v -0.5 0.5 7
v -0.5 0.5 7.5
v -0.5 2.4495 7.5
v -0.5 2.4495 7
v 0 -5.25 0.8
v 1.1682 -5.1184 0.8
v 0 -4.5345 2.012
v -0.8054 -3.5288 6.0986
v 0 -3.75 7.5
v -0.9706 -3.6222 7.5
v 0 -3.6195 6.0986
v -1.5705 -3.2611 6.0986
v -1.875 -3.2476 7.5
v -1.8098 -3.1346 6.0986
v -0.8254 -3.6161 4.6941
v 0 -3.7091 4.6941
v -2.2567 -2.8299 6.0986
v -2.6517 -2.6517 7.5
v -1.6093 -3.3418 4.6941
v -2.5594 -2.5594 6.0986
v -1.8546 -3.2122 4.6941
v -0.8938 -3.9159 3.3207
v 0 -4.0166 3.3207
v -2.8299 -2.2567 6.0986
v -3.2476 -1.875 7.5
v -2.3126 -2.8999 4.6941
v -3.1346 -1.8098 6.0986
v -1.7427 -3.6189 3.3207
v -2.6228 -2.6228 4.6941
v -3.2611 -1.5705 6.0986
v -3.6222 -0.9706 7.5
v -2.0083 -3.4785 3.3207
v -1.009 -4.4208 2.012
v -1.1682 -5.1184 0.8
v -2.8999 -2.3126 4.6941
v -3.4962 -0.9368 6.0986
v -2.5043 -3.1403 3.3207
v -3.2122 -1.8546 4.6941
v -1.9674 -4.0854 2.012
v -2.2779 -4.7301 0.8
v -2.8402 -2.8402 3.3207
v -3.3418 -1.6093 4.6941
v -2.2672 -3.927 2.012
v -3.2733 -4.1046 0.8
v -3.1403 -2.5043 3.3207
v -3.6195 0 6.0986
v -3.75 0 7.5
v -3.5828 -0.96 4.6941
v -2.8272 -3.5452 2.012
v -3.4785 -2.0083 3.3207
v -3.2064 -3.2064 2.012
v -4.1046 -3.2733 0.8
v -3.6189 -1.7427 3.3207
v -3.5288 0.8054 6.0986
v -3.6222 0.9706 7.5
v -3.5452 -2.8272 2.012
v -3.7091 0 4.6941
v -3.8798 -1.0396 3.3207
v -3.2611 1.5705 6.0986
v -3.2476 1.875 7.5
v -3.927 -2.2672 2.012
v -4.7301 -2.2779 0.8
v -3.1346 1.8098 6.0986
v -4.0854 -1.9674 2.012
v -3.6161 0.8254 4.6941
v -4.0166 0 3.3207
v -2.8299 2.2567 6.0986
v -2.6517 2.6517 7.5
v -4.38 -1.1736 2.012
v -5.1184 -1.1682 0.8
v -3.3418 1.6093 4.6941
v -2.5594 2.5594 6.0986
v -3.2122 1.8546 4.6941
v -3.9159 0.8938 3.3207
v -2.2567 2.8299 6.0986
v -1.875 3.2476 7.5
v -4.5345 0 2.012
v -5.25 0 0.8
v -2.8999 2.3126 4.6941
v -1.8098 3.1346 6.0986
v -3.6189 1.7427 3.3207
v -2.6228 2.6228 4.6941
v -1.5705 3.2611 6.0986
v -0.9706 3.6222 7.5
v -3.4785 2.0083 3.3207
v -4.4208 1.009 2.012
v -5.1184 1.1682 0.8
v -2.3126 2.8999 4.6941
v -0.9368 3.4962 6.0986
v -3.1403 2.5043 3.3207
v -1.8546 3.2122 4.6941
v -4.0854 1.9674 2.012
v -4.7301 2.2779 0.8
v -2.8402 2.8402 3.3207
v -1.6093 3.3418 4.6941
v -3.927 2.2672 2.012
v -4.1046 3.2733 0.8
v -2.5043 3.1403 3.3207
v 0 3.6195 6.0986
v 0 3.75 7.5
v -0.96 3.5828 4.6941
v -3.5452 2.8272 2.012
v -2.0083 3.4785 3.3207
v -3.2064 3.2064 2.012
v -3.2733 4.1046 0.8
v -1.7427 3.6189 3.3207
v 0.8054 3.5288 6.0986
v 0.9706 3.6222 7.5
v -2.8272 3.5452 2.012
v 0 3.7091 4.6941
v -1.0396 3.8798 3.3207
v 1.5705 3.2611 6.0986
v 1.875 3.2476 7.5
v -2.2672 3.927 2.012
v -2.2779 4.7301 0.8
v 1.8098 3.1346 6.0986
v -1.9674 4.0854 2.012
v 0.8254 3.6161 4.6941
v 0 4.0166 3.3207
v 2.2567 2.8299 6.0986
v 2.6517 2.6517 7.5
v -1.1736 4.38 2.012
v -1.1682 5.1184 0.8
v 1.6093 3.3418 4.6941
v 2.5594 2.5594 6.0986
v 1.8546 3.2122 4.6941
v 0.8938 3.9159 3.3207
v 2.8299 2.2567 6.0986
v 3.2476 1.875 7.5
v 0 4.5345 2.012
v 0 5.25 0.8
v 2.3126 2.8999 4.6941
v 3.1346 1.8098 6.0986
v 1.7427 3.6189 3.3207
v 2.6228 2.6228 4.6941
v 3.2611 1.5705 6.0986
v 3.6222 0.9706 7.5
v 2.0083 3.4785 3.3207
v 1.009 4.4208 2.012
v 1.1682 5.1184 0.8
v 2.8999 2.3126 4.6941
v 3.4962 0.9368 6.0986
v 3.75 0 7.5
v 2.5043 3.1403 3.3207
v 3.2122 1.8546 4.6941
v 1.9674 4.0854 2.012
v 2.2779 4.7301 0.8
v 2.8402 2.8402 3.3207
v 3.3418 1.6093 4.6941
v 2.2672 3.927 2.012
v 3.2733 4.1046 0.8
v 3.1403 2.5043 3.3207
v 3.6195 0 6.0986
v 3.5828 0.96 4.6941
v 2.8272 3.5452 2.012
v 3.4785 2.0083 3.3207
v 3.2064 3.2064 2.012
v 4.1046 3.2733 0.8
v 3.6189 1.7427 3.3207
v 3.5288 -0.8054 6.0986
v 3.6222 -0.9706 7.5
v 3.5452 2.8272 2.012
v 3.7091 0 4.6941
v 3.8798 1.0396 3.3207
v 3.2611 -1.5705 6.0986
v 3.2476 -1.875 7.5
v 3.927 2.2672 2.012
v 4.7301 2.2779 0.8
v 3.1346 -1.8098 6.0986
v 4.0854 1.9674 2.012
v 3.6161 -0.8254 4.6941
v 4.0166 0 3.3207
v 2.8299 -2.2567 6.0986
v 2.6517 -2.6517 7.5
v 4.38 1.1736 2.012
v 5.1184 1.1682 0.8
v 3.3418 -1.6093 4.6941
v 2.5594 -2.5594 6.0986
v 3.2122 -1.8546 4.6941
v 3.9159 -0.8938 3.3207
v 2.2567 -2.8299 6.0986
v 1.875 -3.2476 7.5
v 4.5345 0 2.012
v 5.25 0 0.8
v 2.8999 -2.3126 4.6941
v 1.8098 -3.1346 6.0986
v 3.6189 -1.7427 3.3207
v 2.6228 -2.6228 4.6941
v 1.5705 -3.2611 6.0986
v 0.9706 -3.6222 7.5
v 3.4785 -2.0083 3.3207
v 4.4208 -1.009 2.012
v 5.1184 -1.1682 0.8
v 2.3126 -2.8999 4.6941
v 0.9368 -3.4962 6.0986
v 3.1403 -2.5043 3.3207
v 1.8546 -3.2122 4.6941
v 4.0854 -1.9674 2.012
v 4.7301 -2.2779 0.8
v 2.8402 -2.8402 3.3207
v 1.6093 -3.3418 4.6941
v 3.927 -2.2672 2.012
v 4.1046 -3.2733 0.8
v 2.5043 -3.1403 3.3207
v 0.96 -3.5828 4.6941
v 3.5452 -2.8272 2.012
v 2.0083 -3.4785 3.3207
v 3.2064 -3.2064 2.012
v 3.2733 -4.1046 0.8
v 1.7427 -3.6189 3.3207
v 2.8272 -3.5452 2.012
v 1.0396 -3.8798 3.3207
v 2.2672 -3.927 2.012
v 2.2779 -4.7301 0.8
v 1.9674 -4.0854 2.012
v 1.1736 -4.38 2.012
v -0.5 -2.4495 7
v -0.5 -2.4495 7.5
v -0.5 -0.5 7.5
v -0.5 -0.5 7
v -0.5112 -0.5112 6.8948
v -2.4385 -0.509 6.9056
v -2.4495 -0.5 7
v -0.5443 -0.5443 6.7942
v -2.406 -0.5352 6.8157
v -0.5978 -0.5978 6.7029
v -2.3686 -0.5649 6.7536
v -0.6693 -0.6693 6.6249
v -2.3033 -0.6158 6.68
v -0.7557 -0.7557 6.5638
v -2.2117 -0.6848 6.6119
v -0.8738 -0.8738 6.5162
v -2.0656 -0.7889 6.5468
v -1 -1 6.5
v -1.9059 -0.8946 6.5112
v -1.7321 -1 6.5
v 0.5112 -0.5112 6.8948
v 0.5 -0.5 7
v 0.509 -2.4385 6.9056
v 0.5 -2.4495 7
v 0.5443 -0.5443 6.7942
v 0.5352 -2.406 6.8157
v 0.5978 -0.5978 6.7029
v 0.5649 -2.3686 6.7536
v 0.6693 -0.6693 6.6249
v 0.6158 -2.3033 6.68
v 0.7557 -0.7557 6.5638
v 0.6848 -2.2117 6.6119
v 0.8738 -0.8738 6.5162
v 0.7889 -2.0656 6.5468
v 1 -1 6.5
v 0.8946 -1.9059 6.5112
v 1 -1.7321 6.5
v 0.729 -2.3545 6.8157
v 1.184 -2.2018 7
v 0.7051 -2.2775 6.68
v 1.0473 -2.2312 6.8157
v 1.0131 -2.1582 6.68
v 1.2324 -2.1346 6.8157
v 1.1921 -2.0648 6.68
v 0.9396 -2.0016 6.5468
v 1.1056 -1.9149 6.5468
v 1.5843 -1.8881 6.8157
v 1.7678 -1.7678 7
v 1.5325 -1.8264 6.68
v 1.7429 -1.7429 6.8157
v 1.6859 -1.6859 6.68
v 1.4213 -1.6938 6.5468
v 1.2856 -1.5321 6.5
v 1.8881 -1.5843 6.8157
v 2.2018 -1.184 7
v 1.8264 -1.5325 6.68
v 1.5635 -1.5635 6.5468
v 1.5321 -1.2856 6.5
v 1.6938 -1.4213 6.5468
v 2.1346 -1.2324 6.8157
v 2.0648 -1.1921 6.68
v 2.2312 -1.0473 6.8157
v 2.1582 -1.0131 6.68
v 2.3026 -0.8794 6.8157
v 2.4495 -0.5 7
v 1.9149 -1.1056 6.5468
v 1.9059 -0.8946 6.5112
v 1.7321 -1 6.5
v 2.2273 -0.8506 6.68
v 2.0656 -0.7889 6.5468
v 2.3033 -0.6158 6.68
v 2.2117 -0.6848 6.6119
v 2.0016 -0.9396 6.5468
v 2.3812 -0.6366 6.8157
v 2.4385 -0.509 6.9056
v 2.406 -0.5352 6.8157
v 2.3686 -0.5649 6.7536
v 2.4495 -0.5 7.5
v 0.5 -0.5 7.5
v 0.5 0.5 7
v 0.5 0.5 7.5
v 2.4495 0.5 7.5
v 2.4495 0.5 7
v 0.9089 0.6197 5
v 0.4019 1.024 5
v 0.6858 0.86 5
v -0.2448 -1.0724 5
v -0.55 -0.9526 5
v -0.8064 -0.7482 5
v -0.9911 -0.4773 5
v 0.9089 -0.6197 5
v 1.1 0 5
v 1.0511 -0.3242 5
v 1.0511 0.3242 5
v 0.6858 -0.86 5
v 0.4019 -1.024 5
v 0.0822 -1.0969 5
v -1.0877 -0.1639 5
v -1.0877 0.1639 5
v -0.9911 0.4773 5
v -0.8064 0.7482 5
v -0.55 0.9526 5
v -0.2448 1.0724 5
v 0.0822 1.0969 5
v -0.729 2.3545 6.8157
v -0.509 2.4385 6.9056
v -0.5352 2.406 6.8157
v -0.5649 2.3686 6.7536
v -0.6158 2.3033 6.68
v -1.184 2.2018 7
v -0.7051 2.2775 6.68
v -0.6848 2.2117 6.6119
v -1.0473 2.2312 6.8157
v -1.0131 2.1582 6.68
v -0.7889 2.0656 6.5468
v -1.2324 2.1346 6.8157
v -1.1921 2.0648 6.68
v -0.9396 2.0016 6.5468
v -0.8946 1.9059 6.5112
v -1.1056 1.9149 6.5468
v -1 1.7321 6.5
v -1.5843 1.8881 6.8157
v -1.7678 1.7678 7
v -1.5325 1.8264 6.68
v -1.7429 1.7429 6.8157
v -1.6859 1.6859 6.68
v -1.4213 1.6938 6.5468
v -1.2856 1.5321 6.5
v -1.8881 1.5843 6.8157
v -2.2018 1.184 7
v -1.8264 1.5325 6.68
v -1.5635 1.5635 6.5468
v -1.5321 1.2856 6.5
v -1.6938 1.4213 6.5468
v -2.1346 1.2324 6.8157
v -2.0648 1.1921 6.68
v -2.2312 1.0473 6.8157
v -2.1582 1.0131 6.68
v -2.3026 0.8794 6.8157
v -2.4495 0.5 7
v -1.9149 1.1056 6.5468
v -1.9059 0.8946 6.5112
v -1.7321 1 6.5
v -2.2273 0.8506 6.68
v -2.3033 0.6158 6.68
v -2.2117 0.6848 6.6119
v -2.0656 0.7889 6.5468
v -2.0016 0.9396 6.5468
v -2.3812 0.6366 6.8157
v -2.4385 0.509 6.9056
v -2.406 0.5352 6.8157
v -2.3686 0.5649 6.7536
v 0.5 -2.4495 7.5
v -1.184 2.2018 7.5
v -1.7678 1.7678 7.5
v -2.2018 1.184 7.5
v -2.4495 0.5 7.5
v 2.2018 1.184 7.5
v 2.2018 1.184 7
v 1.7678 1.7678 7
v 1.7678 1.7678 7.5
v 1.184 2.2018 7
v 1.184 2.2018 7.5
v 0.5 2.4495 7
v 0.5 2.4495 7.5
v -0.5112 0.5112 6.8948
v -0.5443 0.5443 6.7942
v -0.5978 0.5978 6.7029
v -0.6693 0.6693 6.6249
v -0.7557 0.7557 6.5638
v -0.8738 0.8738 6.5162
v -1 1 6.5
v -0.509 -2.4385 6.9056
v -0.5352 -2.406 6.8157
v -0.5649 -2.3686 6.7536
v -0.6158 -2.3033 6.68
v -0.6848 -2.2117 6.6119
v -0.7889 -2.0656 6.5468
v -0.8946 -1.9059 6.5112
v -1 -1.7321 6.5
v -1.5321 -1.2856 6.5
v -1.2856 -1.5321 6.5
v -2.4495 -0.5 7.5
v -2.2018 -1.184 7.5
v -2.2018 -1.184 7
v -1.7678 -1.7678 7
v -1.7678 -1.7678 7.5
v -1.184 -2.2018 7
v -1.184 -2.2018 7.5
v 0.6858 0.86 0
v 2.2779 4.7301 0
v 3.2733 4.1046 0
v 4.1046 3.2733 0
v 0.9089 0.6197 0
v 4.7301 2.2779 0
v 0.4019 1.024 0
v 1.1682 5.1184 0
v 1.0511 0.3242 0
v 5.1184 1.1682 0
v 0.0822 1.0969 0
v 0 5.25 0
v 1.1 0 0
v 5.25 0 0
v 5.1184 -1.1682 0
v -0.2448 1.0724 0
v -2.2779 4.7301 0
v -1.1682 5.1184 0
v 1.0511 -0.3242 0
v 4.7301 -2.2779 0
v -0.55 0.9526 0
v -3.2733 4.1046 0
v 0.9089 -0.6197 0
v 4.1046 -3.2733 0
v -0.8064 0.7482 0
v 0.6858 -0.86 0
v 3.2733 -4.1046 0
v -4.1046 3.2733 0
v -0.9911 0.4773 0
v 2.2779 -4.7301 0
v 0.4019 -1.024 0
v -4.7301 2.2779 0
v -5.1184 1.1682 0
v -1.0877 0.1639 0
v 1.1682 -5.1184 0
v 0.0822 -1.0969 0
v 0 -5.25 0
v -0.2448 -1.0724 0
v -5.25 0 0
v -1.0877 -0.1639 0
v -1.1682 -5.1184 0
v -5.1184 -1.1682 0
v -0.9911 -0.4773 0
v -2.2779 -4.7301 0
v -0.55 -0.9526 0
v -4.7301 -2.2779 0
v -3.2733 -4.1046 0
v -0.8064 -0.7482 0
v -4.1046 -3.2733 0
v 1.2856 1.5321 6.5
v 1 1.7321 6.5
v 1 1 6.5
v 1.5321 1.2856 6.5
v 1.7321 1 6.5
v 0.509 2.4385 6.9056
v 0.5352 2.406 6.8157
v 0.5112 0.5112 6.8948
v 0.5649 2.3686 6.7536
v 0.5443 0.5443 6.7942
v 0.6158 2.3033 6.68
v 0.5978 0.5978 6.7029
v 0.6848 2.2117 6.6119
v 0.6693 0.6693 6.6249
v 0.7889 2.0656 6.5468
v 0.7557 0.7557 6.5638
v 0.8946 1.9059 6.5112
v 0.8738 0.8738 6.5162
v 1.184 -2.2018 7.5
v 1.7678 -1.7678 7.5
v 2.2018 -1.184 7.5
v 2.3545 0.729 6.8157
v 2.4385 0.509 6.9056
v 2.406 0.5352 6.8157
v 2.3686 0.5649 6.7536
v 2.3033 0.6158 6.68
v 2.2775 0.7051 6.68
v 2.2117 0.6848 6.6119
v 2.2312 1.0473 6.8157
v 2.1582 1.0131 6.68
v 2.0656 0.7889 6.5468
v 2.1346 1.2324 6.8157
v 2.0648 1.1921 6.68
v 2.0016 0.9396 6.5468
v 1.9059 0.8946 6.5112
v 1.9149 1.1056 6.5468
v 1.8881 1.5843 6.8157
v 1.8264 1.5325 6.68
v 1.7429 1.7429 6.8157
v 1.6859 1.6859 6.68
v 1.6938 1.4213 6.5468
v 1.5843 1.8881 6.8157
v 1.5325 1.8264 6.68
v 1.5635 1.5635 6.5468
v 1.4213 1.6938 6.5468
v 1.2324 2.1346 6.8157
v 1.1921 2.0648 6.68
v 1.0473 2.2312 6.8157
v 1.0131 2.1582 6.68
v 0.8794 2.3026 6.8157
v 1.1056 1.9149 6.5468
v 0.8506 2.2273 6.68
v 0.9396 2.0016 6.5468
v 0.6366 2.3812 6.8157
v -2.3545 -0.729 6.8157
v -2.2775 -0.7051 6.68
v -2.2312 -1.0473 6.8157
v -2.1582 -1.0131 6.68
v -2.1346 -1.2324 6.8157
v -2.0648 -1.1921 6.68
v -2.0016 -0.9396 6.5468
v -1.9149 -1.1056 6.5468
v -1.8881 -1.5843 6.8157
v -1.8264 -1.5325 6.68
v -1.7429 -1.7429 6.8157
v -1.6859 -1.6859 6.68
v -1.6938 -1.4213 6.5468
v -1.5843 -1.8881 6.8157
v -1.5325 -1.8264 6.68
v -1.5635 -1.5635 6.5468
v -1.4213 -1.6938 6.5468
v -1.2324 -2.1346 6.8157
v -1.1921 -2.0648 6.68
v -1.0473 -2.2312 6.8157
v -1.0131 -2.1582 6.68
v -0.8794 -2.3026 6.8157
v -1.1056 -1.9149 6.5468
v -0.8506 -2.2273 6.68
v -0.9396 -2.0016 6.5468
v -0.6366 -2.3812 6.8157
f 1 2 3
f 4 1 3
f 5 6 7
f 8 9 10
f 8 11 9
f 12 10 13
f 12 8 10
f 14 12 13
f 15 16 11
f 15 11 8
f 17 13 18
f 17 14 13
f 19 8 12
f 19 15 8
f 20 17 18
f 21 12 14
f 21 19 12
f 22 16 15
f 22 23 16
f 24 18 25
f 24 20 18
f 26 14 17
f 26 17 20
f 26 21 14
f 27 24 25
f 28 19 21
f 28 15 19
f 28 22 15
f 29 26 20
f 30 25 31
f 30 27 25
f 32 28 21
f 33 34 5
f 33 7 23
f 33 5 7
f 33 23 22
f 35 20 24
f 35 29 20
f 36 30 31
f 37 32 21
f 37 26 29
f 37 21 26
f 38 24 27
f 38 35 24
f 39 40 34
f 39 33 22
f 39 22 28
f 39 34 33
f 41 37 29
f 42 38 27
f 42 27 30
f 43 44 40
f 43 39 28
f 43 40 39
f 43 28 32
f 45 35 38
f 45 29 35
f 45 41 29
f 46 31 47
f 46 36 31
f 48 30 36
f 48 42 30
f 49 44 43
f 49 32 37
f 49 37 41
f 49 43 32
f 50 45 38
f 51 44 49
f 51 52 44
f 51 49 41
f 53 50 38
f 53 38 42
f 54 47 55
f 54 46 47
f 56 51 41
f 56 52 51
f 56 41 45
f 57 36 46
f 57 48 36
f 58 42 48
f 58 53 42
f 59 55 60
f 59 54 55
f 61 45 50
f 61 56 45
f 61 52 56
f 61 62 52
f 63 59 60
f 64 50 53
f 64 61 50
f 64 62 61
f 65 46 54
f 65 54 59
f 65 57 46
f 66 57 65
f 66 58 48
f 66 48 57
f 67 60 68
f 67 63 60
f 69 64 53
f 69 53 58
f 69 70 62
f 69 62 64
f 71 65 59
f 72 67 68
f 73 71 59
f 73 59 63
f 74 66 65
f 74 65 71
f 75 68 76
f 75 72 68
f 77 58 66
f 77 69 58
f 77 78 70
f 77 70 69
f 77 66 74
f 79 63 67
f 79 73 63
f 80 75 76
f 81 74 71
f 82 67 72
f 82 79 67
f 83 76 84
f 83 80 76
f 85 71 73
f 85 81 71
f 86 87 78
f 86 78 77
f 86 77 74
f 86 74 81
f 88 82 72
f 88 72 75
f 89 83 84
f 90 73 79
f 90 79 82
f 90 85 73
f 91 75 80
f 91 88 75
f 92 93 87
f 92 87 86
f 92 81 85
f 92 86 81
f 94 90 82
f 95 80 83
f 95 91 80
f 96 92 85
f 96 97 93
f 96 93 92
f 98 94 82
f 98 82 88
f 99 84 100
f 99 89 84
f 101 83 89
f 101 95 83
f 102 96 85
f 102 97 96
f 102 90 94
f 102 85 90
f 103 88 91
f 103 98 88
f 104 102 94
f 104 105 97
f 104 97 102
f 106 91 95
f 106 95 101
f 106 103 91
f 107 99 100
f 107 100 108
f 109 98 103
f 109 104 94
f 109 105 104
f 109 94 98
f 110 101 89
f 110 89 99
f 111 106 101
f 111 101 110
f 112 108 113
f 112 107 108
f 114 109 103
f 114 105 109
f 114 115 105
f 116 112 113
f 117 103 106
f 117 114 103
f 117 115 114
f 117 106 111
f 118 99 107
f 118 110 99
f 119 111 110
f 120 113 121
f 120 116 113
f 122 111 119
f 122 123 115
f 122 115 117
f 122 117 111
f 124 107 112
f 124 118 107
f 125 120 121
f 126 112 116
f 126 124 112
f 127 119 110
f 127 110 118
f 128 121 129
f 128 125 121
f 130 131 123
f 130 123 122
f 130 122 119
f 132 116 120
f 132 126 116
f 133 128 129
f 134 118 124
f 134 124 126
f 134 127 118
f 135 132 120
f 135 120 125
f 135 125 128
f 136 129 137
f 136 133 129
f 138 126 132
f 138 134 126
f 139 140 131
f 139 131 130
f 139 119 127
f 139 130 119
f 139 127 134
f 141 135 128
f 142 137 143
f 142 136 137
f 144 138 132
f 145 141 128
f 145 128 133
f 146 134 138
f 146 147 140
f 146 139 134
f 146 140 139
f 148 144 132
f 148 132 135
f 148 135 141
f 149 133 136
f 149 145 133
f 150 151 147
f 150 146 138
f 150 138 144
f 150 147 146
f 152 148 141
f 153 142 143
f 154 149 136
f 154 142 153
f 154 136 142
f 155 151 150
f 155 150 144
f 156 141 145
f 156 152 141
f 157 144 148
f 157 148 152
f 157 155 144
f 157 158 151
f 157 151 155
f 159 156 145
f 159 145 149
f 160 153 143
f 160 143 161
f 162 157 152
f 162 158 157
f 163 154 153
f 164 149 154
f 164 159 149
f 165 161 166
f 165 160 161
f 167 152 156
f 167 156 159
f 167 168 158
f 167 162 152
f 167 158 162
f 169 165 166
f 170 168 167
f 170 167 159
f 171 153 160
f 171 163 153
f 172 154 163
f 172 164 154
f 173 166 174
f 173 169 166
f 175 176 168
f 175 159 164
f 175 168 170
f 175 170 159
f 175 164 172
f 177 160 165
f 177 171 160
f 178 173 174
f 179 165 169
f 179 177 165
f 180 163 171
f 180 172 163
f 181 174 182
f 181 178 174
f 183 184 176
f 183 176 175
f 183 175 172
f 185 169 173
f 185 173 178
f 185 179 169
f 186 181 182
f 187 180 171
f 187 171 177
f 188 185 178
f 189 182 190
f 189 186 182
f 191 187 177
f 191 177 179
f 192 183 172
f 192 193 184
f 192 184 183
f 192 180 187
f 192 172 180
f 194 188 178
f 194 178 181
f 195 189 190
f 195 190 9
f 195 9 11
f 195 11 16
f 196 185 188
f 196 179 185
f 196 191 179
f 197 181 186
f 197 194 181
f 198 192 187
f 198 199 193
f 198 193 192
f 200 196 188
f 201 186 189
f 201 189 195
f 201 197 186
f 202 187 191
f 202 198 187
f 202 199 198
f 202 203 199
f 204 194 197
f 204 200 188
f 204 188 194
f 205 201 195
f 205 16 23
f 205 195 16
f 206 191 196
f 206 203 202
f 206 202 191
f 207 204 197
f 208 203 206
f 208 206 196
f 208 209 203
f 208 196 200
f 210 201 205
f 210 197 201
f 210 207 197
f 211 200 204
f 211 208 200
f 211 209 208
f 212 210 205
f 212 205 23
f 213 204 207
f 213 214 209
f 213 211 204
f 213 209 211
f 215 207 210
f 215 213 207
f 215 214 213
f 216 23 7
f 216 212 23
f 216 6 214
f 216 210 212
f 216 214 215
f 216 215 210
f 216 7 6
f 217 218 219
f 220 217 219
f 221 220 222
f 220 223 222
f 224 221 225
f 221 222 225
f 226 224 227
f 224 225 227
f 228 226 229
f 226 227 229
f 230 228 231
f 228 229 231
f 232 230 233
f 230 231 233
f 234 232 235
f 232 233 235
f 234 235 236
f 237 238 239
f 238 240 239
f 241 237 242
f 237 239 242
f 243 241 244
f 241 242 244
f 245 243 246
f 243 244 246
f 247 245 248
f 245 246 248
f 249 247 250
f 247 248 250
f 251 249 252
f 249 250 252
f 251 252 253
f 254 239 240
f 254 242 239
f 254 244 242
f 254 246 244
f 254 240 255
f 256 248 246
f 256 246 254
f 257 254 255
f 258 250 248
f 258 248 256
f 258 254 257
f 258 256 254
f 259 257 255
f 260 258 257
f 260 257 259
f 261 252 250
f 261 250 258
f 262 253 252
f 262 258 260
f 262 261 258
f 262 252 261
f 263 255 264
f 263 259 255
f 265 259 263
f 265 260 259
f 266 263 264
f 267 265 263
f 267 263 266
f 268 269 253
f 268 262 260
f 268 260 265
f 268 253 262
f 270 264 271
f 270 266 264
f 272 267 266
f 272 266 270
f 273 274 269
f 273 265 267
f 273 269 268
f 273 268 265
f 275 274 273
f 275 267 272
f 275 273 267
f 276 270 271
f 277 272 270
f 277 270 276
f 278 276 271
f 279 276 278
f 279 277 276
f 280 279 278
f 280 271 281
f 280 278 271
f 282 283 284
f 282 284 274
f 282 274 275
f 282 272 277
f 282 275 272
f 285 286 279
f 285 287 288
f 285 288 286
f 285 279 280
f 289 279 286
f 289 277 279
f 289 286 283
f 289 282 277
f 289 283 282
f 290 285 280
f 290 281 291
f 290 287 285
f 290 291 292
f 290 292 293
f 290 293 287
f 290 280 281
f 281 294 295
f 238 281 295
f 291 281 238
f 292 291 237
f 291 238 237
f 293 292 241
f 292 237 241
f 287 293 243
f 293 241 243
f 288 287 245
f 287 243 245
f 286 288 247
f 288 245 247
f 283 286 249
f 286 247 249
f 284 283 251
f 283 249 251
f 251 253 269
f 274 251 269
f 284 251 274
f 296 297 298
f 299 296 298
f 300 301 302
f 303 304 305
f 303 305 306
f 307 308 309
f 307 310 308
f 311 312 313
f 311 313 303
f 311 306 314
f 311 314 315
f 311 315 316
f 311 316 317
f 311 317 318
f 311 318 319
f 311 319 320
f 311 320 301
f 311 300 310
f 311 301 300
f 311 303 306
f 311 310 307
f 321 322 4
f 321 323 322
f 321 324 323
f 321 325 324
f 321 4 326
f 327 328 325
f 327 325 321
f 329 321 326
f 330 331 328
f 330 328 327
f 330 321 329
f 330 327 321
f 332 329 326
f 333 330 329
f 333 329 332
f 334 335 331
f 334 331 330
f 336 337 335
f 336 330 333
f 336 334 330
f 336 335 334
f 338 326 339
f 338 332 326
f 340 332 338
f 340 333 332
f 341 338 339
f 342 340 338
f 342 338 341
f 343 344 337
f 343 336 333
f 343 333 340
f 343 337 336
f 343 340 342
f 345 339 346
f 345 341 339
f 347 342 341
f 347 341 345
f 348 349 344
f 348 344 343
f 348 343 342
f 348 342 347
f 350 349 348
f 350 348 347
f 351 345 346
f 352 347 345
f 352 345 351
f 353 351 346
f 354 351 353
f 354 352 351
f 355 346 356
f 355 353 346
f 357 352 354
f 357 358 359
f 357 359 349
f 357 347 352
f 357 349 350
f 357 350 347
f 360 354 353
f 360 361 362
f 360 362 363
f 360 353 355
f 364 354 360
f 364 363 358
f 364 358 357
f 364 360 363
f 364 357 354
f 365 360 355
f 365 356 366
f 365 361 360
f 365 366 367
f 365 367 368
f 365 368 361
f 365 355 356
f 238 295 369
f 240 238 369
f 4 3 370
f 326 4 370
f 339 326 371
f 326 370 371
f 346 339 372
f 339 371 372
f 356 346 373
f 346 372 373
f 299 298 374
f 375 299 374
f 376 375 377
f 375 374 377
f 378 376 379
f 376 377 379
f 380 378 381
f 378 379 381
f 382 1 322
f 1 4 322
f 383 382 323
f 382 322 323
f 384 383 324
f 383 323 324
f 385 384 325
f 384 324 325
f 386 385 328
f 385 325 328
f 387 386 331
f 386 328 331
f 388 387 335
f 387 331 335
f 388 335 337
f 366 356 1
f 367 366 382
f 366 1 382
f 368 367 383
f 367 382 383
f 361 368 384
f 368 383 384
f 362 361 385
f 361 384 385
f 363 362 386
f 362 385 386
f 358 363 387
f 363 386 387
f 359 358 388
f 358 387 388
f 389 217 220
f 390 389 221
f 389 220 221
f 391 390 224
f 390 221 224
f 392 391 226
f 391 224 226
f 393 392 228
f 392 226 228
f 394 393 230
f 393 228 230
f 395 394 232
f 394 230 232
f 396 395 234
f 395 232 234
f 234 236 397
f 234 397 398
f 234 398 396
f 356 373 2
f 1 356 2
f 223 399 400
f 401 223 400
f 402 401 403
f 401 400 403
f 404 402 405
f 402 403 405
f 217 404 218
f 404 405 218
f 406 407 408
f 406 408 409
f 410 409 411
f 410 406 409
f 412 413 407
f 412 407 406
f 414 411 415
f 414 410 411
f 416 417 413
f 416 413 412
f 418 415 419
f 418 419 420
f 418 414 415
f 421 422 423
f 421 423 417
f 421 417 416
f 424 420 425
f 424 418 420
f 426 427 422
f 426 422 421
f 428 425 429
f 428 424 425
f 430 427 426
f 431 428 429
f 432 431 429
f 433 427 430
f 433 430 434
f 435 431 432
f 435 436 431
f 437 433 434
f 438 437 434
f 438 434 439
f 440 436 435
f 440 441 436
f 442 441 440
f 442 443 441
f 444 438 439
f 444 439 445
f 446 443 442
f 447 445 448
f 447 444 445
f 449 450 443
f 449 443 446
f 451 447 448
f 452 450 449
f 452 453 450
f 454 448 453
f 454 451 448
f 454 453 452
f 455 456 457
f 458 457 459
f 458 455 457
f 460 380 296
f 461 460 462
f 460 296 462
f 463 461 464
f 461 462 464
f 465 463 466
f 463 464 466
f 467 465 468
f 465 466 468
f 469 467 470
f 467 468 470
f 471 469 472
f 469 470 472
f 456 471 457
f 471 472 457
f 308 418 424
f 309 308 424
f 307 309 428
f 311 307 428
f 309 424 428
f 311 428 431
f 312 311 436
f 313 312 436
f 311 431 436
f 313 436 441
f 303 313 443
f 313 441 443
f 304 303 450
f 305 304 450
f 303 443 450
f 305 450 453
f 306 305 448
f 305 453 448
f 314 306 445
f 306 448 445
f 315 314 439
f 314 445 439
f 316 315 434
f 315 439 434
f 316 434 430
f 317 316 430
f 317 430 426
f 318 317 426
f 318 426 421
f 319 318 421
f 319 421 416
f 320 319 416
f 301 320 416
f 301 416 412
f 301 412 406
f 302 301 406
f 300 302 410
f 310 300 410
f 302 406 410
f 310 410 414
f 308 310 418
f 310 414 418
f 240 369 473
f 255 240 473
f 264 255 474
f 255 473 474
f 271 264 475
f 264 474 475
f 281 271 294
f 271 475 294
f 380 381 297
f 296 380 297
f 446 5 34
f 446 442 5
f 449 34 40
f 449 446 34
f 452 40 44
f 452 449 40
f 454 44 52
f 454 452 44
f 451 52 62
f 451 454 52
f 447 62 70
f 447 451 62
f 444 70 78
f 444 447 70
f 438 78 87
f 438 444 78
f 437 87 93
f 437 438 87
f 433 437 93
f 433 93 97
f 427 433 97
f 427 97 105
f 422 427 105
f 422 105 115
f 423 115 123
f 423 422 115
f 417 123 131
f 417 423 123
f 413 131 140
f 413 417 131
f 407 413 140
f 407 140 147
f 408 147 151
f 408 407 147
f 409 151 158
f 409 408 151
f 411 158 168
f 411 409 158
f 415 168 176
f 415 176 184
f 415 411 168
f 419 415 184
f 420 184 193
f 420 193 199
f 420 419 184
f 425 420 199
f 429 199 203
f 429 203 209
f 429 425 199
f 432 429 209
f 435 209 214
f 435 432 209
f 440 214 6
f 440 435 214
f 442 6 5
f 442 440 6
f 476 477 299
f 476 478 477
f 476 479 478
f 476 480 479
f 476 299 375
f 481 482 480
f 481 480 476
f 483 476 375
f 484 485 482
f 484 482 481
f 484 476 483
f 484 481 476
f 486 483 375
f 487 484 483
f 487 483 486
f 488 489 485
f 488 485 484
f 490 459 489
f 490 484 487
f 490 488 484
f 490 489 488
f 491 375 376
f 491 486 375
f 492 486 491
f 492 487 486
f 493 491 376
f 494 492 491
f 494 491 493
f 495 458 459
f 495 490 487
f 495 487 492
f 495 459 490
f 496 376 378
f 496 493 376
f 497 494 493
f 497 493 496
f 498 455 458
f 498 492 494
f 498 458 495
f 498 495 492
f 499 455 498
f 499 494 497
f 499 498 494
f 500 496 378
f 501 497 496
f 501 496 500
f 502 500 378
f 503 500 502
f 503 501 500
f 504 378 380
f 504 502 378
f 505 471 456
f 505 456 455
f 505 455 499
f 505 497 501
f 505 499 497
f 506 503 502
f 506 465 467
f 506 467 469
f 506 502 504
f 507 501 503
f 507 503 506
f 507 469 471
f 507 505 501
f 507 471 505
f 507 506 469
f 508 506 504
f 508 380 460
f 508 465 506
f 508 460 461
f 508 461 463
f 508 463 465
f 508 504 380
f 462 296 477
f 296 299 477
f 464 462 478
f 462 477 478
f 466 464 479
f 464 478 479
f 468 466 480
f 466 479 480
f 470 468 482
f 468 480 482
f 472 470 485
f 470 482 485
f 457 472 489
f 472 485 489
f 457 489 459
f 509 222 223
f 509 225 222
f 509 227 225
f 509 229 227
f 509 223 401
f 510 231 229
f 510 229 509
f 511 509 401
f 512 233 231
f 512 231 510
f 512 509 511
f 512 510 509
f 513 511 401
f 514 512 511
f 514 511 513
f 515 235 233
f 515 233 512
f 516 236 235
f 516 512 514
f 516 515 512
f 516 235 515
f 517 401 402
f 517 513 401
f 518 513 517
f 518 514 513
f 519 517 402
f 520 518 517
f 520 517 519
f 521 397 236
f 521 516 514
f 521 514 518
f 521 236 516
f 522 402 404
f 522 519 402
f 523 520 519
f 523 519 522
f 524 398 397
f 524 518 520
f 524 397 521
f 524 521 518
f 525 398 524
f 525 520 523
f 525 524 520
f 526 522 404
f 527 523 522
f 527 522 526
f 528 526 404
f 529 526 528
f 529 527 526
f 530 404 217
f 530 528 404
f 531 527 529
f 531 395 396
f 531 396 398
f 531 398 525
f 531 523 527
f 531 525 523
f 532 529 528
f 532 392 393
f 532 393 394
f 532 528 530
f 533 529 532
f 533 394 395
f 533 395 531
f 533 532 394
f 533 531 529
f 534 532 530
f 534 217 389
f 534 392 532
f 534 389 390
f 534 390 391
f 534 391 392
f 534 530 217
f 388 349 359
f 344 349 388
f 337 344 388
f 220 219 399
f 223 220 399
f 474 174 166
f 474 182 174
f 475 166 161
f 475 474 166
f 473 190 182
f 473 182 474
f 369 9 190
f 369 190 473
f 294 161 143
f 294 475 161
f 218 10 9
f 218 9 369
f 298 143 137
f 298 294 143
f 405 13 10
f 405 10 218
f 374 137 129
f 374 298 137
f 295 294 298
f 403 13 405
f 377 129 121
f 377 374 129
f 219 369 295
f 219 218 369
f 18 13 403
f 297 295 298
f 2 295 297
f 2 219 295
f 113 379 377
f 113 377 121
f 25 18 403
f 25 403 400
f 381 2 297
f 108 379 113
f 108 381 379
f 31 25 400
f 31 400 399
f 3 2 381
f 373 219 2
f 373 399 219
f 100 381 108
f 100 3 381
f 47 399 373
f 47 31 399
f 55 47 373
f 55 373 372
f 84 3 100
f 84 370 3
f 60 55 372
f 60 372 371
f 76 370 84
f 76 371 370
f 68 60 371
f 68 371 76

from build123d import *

# Parameters (mm, degrees)
F2_R     = 1.1
F3_DEPTH = 5
F5_DEPTH = 1
F6_R     = 0.5


with BuildPart() as f1:
    # F0 (on Right) → F1 (revolve)
    with BuildSketch(Plane.YZ):
        with BuildLine():
            Line((-5.25, 0), (0, 0))
            Line((0, 0), (0, 7.5))
            Line((0, 7.5), (-3.75, 7.5))
            ThreePointArc((-3.75, 7.5), (-3.835993, 4.001342), (-5.25, 0.8))
            Line((-5.25, 0.8), (-5.25, 0))
        make_face()
    revolve(axis=Axis((0, 0, 7.262046), (0, 0, -1)))

    # F2 (on face) → F3 (cut)
    with BuildSketch(Plane(origin=(0, 0, 0), x_dir=(1, 0, 0), z_dir=(0, 0, -1))):
        Circle(F2_R)
    extrude(amount=-F3_DEPTH, mode=Mode.SUBTRACT)

    # F4 (on face) → F5 (cut)
    with BuildSketch(Plane.XY.offset(7.5)):
        with BuildLine():
            Line((-0.5, 0.5), (-0.5, 2.44949))
            ThreePointArc((-0.5, 2.44949), (-1.767767, 1.767767), (-2.44949, 0.5))
            Line((-2.44949, 0.5), (-0.5, 0.5))
        make_face()
        with BuildLine():
            ThreePointArc((2.44949, 0.5), (1.767767, 1.767767), (0.5, 2.44949))
            Line((0.5, 2.44949), (0.5, 0.5))
            Line((0.5, 0.5), (2.44949, 0.5))
        make_face()
        with BuildLine():
            Line((-0.5, -0.5), (-2.44949, -0.5))
            ThreePointArc((-2.44949, -0.5), (-1.767767, -1.767767), (-0.5, -2.44949))
            Line((-0.5, -2.44949), (-0.5, -0.5))
        make_face()
        with BuildLine():
            Line((0.5, -0.5), (0.5, -2.44949))
            ThreePointArc((0.5, -2.44949), (1.767767, -1.767767), (2.44949, -0.5))
            Line((2.44949, -0.5), (0.5, -0.5))
        make_face()
    extrude(amount=-F5_DEPTH, mode=Mode.SUBTRACT)

    # F6
    f6_edges = [f1.edges().sort_by_distance(p)[0] for p in [
        (-1.474745, 0.5, 6.5),
        (-0.5, 1.474745, 6.5),
        (-1.767767, 1.767767, 6.5),
        (1.767767, 1.767767, 6.5),
        (0.5, 1.474745, 6.5),
        (1.474745, 0.5, 6.5),
        (1.474745, -0.5, 6.5),
        (0.5, -1.474745, 6.5),
        (1.767767, -1.767767, 6.5),
        (-0.5, -1.474745, 6.5),
        (-1.474745, -0.5, 6.5),
        (-1.767767, -1.767767, 6.5),
    ]]
    fillet(f6_edges, radius=F6_R)


solid = f1.part
